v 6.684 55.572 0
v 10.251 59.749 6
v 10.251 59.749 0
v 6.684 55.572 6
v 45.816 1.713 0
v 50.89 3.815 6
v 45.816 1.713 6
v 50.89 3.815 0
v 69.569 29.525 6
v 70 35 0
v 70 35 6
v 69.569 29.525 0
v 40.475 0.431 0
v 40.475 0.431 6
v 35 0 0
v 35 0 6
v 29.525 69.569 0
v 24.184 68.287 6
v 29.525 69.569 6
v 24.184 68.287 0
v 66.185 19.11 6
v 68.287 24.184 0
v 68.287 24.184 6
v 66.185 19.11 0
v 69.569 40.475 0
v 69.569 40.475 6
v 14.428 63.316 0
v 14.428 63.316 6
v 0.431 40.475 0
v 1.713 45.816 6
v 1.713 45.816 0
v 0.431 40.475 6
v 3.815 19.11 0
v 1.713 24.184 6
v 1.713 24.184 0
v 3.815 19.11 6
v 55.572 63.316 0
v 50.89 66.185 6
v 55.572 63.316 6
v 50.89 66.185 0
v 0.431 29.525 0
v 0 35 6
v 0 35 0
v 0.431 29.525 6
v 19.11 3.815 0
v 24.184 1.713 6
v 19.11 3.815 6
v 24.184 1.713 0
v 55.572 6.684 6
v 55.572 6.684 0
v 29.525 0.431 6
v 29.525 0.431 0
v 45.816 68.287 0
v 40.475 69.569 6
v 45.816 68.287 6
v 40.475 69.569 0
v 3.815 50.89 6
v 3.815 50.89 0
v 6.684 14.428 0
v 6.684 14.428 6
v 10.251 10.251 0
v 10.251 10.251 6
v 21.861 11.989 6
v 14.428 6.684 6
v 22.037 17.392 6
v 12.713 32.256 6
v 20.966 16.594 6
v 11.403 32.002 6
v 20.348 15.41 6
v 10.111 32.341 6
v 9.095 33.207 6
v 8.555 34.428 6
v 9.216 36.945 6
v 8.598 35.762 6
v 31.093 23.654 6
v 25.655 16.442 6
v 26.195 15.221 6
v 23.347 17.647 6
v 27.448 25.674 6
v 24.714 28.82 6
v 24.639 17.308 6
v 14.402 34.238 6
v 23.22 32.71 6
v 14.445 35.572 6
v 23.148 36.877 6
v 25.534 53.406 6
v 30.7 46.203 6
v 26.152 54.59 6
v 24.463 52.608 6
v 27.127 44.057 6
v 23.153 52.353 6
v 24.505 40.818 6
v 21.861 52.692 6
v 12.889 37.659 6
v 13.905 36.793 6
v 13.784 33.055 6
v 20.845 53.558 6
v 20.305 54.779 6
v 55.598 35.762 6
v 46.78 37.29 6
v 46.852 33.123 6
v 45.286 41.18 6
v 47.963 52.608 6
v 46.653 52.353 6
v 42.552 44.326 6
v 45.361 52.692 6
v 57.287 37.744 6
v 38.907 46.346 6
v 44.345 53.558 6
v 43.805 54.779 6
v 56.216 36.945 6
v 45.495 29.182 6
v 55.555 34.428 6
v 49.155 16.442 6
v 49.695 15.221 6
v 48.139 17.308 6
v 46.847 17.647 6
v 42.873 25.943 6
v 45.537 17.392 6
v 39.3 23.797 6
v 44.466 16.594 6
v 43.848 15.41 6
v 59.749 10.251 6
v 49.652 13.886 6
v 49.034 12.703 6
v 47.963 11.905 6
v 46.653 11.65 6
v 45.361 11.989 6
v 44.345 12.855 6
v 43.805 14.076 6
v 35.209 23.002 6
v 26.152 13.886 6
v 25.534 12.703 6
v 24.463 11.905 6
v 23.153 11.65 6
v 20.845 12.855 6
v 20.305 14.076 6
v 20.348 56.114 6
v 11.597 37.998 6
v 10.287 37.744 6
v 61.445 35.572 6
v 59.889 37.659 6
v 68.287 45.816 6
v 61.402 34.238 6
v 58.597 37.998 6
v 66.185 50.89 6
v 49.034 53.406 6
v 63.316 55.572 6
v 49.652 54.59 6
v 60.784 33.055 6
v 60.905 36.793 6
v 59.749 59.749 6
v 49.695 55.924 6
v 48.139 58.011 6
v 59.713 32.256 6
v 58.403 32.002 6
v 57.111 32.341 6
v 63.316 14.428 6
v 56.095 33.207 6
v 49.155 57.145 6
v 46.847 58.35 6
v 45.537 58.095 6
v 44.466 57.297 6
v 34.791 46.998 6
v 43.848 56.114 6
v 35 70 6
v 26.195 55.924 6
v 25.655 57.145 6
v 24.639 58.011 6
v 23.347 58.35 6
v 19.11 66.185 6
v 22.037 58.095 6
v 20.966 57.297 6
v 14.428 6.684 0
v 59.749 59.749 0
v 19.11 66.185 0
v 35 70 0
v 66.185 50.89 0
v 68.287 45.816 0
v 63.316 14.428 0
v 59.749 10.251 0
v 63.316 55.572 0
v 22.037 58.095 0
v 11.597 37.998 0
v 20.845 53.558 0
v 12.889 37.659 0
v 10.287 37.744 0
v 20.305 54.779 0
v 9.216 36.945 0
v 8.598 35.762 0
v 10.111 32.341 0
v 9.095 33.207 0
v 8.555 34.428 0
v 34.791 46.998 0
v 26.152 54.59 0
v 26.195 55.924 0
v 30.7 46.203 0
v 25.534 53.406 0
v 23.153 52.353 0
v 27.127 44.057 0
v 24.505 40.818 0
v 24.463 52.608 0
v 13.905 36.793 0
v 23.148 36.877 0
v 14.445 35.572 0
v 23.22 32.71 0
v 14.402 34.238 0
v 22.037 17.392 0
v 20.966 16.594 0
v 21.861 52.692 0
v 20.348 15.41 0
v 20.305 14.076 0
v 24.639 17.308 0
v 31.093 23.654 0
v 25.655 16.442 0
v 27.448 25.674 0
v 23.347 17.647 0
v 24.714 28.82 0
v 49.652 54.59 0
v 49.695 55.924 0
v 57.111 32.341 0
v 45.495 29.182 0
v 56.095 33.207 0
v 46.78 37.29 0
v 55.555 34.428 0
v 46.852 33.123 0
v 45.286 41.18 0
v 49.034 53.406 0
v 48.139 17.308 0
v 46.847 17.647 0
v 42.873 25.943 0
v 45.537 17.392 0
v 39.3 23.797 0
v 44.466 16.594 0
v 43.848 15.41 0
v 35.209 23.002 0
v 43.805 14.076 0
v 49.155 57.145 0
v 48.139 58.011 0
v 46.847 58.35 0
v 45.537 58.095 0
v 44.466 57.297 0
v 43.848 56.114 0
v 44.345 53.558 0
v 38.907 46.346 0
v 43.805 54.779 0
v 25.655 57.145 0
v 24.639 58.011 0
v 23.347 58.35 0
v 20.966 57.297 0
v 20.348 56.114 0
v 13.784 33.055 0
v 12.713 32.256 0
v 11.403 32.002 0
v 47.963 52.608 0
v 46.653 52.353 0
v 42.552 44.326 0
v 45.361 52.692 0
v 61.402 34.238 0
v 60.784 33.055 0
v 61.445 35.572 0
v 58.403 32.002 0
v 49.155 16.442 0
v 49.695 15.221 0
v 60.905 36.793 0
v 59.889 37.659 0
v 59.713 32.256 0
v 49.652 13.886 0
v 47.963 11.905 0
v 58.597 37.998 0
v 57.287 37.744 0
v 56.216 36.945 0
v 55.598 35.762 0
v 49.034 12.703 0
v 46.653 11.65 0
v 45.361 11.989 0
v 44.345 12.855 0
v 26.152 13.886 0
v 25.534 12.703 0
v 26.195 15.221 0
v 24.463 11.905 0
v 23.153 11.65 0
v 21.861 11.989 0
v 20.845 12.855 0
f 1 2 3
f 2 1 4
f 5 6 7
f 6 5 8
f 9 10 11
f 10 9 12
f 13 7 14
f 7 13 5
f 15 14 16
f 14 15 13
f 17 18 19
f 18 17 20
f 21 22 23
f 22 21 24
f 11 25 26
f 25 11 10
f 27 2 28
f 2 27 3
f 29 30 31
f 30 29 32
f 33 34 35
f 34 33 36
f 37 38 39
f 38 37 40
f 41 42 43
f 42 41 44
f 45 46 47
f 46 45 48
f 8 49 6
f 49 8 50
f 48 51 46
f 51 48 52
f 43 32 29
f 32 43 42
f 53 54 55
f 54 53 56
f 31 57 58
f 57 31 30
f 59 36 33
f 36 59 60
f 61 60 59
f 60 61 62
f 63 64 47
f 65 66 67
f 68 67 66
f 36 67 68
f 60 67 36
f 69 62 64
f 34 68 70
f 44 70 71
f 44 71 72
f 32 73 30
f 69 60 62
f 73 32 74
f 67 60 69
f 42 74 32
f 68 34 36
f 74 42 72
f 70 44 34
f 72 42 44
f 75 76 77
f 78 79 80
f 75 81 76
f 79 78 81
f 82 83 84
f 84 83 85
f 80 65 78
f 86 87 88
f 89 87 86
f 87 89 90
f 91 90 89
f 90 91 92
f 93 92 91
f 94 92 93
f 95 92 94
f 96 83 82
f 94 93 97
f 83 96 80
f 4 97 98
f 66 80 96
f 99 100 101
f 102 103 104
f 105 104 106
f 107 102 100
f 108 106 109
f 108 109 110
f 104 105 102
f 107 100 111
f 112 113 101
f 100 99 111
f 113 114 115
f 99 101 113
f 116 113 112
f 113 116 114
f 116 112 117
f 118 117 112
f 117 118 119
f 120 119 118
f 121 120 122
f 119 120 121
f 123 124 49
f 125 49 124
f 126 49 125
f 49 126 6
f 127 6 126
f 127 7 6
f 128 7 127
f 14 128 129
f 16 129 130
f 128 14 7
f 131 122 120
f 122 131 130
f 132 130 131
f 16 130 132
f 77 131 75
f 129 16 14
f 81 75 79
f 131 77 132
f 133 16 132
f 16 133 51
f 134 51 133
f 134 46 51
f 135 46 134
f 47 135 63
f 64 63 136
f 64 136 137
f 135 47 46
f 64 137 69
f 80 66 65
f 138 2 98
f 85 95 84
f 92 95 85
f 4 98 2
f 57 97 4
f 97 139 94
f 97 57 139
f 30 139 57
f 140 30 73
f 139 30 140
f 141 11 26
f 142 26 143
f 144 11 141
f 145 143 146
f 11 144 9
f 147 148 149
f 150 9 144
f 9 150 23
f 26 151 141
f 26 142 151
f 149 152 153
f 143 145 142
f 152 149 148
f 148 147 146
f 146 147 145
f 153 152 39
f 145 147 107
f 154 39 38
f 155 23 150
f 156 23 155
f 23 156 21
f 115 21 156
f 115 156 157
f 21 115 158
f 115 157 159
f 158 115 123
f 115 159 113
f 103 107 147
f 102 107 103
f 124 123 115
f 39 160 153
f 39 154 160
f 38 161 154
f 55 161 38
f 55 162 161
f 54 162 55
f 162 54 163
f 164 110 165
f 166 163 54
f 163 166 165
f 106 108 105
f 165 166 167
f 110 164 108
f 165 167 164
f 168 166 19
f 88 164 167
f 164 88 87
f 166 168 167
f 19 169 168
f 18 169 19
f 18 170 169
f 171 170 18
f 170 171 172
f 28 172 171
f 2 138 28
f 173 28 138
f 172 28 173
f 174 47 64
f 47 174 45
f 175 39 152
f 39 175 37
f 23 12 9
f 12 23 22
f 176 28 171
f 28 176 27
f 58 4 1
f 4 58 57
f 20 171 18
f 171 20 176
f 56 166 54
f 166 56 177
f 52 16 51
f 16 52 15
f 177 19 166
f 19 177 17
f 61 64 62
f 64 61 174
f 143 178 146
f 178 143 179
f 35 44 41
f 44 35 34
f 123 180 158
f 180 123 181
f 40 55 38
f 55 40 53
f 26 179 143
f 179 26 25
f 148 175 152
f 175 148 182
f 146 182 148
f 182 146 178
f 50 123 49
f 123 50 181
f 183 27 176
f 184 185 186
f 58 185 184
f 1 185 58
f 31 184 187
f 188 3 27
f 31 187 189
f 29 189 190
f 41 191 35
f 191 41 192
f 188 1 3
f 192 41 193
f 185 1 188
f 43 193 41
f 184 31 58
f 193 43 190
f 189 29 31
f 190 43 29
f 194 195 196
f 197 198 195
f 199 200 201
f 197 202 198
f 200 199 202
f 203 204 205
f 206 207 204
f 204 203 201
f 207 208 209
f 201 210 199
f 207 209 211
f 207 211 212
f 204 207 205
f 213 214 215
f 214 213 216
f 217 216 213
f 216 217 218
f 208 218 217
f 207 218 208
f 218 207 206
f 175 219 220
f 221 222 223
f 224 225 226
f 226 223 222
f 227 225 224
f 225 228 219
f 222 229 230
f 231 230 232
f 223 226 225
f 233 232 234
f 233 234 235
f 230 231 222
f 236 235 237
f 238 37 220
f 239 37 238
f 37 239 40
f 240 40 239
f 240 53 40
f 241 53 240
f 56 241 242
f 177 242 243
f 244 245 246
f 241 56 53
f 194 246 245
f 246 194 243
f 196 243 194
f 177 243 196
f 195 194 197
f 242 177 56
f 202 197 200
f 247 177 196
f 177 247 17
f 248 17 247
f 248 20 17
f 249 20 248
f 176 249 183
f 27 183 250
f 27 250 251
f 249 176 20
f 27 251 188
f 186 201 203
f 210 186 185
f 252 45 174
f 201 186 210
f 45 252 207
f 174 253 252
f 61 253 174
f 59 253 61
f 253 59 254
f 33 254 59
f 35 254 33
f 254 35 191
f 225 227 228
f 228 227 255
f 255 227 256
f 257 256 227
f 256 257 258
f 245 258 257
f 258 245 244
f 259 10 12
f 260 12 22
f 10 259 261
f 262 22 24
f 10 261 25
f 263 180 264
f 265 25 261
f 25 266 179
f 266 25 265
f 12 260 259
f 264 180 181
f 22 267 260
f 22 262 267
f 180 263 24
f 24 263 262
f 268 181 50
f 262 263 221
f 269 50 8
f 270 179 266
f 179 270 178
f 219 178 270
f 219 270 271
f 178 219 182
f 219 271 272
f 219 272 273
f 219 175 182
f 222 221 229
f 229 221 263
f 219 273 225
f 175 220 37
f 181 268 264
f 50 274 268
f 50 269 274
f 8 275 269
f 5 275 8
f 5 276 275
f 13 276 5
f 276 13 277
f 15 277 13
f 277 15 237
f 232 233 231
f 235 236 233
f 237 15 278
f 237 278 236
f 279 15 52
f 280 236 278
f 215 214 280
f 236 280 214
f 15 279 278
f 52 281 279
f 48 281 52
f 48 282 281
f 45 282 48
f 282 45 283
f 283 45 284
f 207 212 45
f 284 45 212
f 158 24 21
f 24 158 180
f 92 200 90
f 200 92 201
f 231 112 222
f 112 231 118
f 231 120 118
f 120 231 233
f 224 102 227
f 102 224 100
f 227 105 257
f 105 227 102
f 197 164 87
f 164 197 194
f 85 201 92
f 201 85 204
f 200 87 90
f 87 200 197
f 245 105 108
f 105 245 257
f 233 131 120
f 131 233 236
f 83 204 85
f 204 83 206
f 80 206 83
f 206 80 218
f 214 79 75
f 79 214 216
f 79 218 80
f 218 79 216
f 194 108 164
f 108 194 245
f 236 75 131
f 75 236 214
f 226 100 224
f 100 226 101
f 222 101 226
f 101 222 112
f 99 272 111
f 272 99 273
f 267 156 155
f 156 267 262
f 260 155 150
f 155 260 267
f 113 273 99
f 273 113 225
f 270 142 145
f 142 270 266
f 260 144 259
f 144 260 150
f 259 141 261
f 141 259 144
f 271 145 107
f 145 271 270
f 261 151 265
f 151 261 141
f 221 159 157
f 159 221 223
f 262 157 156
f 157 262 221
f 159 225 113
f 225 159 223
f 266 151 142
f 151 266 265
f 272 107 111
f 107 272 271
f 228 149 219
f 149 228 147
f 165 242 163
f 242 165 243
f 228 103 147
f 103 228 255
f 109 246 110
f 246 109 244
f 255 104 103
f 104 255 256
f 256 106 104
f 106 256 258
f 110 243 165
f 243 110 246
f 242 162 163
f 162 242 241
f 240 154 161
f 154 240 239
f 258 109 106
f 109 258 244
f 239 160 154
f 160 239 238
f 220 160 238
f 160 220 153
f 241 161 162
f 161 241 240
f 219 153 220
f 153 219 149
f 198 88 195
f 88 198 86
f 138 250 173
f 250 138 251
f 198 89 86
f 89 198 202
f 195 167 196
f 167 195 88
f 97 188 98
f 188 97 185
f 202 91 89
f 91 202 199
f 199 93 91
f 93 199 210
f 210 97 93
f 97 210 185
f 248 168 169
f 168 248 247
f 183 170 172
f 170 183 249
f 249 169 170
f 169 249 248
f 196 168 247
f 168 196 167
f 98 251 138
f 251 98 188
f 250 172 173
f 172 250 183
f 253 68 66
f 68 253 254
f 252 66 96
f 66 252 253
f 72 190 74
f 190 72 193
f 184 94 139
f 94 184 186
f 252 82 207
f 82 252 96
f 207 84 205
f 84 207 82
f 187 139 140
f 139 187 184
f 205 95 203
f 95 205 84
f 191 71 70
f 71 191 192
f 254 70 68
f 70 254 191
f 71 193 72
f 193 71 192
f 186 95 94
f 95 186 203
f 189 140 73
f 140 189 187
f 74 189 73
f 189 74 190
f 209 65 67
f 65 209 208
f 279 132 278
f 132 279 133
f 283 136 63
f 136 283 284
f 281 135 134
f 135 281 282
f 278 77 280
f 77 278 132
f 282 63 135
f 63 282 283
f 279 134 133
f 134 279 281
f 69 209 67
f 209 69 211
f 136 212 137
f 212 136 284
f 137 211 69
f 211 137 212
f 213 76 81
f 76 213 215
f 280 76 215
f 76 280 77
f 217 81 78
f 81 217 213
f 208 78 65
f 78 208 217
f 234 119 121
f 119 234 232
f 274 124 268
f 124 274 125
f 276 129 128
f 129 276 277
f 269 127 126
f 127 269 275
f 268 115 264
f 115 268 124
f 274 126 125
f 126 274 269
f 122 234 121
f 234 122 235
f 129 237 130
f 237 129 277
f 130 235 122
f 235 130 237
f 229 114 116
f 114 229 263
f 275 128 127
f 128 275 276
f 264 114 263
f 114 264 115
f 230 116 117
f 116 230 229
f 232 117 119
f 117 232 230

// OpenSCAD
$fn = 32;

// ----------------------------------------------------------------------
// Spacer plate: round flange R35, 6 bolts
// ----------------------------------------------------------------------

// --- parameters (mm) ---
bore_r = 12;              // centre bore radius
bolt_r = 3;               // bolt hole radius
plate_t = 6;              // plate thickness, Z (extrusion height)
flange_r = 35;            // flange radius
n_bolt = 6;               // bolt hole count
ring_r = 23.5;            // bolt circle radius

profile = [[70, 35], [69.569, 40.475], [68.287, 45.816], [66.185, 50.89], [63.316, 55.572], [59.749, 59.749], [55.572, 63.316], [50.89, 66.185], [45.816, 68.287], [40.475, 69.569], [35, 70], [29.525, 69.569], [24.184, 68.287], [19.11, 66.185], [14.428, 63.316], [10.251, 59.749], [6.684, 55.572], [3.815, 50.89], [1.713, 45.816], [0.431, 40.475], [0, 35], [0.431, 29.525], [1.713, 24.184], [3.815, 19.11], [6.684, 14.428], [10.251, 10.251], [14.428, 6.684], [19.11, 3.815], [24.184, 1.713], [29.525, 0.431], [35, 0], [40.475, 0.431], [45.816, 1.713], [50.89, 3.815], [55.572, 6.684], [59.749, 10.251], [63.316, 14.428], [66.185, 19.11], [68.287, 24.184], [69.569, 29.525]];  // primary outline, 40 points, counter clockwise
void_1 = [[46.78, 37.29], [45.286, 41.18], [42.552, 44.326], [38.907, 46.346], [34.791, 46.998], [30.7, 46.203], [27.127, 44.057], [24.505, 40.818], [23.148, 36.877], [23.22, 32.71], [24.714, 28.82], [27.448, 25.674], [31.093, 23.654], [35.209, 23.002], [39.3, 23.797], [42.873, 25.943], [45.495, 29.182], [46.852, 33.123]];  // centre bore, 18 points
void_2 = [[61.445, 35.572], [60.905, 36.793], [59.889, 37.659], [58.597, 37.998], [57.287, 37.744], [56.216, 36.945], [55.598, 35.762], [55.555, 34.428], [56.095, 33.207], [57.111, 32.341], [58.403, 32.002], [59.713, 32.256], [60.784, 33.055], [61.402, 34.238]];  // bolt hole 1, 14 points
void_3 = [[49.695, 55.924], [49.155, 57.145], [48.139, 58.011], [46.847, 58.35], [45.537, 58.095], [44.466, 57.297], [43.848, 56.114], [43.805, 54.779], [44.345, 53.558], [45.361, 52.692], [46.653, 52.353], [47.963, 52.608], [49.034, 53.406], [49.652, 54.59]];  // bolt hole 2, 14 points
void_4 = [[26.195, 55.924], [25.655, 57.145], [24.639, 58.011], [23.347, 58.35], [22.037, 58.095], [20.966, 57.297], [20.348, 56.114], [20.305, 54.779], [20.845, 53.558], [21.861, 52.692], [23.153, 52.353], [24.463, 52.608], [25.534, 53.406], [26.152, 54.59]];  // bolt hole 3, 14 points
void_5 = [[14.445, 35.572], [13.905, 36.793], [12.889, 37.659], [11.597, 37.998], [10.287, 37.744], [9.216, 36.945], [8.598, 35.762], [8.555, 34.428], [9.095, 33.207], [10.111, 32.341], [11.403, 32.002], [12.713, 32.256], [13.784, 33.055], [14.402, 34.238]];  // bolt hole 4, 14 points
void_6 = [[26.195, 15.221], [25.655, 16.442], [24.639, 17.308], [23.347, 17.647], [22.037, 17.392], [20.966, 16.594], [20.348, 15.41], [20.305, 14.076], [20.845, 12.855], [21.861, 11.989], [23.153, 11.65], [24.463, 11.905], [25.534, 12.703], [26.152, 13.886]];  // bolt hole 5, 14 points
void_7 = [[49.695, 15.221], [49.155, 16.442], [48.139, 17.308], [46.847, 17.647], [45.537, 17.392], [44.466, 16.594], [43.848, 15.41], [43.805, 14.076], [44.345, 12.855], [45.361, 11.989], [46.653, 11.65], [47.963, 11.905], [49.034, 12.703], [49.652, 13.886]];  // bolt hole 6, 14 points

// --- the one profile operation ---
difference() {
  linear_extrude(height = plate_t) polygon(points = profile);
  translate([0, 0, -1])
    linear_extrude(height = plate_t + 2) polygon(points = void_1);
  translate([0, 0, -1])
    linear_extrude(height = plate_t + 2) polygon(points = void_2);
  translate([0, 0, -1])
    linear_extrude(height = plate_t + 2) polygon(points = void_3);
  translate([0, 0, -1])
    linear_extrude(height = plate_t + 2) polygon(points = void_4);
  translate([0, 0, -1])
    linear_extrude(height = plate_t + 2) polygon(points = void_5);
  translate([0, 0, -1])
    linear_extrude(height = plate_t + 2) polygon(points = void_6);
  translate([0, 0, -1])
    linear_extrude(height = plate_t + 2) polygon(points = void_7);
}
